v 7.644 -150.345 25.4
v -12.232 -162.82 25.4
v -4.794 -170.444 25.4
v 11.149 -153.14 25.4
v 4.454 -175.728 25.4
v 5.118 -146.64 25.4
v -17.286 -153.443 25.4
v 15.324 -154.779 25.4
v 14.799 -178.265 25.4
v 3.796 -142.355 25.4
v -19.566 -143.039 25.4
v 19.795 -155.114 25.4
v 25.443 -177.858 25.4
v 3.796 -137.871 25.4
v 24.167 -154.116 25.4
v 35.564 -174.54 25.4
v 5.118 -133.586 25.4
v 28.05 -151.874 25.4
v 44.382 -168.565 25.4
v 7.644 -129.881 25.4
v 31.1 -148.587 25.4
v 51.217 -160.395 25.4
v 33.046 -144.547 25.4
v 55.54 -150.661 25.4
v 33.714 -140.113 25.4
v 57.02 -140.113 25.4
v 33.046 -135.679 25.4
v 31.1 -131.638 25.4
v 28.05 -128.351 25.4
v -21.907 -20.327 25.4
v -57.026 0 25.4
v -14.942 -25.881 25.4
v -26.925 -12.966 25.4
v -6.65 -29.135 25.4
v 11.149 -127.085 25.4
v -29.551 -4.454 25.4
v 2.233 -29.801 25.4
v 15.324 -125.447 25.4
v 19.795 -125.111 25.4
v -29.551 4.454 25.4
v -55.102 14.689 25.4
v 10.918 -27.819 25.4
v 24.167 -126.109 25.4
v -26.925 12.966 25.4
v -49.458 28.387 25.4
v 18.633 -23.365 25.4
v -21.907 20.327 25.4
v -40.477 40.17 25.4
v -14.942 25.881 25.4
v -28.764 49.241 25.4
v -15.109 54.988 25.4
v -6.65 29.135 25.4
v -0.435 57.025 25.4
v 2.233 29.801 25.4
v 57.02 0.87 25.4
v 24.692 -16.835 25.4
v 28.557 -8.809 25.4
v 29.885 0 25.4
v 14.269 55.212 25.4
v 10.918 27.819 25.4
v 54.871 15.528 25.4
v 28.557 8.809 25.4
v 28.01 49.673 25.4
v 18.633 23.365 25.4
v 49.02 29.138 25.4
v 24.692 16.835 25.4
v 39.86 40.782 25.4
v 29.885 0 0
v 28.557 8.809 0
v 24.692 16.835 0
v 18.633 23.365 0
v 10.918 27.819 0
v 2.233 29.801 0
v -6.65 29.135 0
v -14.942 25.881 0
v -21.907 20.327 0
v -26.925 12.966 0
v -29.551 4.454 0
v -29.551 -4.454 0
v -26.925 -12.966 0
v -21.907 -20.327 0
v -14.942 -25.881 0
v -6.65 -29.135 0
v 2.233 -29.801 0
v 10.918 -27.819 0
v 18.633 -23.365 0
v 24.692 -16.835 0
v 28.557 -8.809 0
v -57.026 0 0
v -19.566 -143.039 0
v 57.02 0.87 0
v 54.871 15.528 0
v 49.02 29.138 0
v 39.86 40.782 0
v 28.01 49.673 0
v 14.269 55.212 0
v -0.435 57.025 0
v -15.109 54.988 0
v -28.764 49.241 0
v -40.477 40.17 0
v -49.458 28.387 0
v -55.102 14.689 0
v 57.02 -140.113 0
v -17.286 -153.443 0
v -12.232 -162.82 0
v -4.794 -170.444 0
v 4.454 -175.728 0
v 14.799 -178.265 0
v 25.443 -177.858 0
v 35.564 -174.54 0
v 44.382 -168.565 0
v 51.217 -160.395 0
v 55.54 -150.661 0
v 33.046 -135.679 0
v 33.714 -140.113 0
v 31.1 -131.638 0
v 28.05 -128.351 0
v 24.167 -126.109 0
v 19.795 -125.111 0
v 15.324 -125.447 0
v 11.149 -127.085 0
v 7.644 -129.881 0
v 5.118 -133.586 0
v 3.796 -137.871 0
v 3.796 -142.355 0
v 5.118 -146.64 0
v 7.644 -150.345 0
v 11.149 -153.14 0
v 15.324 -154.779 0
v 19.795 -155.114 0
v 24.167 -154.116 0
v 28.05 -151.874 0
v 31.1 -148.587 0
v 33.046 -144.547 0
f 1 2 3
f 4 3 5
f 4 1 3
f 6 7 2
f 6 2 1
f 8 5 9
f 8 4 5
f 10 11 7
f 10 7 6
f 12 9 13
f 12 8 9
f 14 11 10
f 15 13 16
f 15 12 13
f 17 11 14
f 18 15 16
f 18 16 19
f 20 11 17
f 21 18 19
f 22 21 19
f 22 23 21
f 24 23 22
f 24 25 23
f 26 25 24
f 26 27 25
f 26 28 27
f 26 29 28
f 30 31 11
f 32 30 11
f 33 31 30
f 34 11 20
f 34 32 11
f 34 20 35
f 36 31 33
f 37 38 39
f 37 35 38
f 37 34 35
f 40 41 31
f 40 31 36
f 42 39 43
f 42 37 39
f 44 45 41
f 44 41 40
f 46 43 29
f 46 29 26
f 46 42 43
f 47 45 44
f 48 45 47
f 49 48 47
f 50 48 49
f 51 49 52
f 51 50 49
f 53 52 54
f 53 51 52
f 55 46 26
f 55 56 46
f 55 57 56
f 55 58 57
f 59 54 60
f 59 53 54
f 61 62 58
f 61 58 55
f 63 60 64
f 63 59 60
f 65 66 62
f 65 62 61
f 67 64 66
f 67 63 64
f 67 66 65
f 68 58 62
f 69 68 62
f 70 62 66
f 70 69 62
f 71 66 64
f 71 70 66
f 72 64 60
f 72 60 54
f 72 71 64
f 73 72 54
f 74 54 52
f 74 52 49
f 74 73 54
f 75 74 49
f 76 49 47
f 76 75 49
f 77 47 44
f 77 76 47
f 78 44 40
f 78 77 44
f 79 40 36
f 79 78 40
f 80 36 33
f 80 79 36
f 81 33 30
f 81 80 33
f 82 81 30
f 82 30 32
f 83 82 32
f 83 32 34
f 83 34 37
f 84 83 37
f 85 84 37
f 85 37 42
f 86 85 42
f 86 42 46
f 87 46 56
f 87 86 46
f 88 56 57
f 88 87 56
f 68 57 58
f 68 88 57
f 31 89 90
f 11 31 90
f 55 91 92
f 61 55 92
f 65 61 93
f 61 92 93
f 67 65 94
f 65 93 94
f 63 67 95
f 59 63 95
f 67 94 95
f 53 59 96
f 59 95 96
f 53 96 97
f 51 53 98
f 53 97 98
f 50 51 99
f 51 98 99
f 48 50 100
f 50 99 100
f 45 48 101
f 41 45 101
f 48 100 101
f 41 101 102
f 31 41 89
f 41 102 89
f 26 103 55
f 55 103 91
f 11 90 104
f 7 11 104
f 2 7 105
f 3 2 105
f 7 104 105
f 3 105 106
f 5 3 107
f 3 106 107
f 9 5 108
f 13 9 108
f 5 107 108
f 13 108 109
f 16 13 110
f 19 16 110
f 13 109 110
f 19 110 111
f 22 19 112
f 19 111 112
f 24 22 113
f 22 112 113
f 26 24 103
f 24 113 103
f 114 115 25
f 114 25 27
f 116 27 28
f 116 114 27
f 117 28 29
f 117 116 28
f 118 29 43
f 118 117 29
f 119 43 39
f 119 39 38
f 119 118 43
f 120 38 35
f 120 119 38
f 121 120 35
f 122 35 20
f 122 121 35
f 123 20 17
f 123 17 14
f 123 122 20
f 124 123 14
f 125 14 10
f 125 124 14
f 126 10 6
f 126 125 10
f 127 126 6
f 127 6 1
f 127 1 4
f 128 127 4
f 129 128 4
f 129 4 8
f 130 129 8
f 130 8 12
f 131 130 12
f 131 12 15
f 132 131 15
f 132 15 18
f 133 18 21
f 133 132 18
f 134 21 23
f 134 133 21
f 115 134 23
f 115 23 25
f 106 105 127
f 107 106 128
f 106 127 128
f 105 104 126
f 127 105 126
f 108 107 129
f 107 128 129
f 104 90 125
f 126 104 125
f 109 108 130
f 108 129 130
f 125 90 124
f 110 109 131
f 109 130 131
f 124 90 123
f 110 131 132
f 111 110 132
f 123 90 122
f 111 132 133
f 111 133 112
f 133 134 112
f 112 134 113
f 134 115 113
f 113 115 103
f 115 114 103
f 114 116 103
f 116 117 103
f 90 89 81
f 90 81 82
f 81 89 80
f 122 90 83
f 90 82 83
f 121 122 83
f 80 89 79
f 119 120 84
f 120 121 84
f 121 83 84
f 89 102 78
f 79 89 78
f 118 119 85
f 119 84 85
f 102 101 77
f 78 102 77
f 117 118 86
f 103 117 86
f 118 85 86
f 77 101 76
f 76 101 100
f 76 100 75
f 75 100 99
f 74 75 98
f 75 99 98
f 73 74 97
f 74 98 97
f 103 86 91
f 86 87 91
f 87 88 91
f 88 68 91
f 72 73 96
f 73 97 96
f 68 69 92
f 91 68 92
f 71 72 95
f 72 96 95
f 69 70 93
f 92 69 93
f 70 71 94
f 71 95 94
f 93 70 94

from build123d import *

# Parameters (mm, degrees)
F0_R     = 15.043231
F0_R_2   = 29.884634
F1_DEPTH = 25.4


with BuildPart() as f1:
    # F0 (on Top) → F1 (new body)
    with BuildSketch(Plane.XY):
        with BuildLine():
            ThreePointArc((57.019541, 0.869514), (-0.43477, 57.024513), (-57.02617, 0))
            Line((-57.02617, 0), (-19.565552, -143.03863))
            ThreePointArc((-19.565552, -143.03863), (20.135156, -178.433137), (57.019541, -140.112653))
            Line((57.019541, -140.112653), (57.019541, 0.869514))
        make_face()
        with Locations((18.6711, -140.112653)):
            Circle(F0_R, mode=Mode.SUBTRACT)
        Circle(F0_R_2, mode=Mode.SUBTRACT)
    extrude(amount=F1_DEPTH)


solid = f1.part
